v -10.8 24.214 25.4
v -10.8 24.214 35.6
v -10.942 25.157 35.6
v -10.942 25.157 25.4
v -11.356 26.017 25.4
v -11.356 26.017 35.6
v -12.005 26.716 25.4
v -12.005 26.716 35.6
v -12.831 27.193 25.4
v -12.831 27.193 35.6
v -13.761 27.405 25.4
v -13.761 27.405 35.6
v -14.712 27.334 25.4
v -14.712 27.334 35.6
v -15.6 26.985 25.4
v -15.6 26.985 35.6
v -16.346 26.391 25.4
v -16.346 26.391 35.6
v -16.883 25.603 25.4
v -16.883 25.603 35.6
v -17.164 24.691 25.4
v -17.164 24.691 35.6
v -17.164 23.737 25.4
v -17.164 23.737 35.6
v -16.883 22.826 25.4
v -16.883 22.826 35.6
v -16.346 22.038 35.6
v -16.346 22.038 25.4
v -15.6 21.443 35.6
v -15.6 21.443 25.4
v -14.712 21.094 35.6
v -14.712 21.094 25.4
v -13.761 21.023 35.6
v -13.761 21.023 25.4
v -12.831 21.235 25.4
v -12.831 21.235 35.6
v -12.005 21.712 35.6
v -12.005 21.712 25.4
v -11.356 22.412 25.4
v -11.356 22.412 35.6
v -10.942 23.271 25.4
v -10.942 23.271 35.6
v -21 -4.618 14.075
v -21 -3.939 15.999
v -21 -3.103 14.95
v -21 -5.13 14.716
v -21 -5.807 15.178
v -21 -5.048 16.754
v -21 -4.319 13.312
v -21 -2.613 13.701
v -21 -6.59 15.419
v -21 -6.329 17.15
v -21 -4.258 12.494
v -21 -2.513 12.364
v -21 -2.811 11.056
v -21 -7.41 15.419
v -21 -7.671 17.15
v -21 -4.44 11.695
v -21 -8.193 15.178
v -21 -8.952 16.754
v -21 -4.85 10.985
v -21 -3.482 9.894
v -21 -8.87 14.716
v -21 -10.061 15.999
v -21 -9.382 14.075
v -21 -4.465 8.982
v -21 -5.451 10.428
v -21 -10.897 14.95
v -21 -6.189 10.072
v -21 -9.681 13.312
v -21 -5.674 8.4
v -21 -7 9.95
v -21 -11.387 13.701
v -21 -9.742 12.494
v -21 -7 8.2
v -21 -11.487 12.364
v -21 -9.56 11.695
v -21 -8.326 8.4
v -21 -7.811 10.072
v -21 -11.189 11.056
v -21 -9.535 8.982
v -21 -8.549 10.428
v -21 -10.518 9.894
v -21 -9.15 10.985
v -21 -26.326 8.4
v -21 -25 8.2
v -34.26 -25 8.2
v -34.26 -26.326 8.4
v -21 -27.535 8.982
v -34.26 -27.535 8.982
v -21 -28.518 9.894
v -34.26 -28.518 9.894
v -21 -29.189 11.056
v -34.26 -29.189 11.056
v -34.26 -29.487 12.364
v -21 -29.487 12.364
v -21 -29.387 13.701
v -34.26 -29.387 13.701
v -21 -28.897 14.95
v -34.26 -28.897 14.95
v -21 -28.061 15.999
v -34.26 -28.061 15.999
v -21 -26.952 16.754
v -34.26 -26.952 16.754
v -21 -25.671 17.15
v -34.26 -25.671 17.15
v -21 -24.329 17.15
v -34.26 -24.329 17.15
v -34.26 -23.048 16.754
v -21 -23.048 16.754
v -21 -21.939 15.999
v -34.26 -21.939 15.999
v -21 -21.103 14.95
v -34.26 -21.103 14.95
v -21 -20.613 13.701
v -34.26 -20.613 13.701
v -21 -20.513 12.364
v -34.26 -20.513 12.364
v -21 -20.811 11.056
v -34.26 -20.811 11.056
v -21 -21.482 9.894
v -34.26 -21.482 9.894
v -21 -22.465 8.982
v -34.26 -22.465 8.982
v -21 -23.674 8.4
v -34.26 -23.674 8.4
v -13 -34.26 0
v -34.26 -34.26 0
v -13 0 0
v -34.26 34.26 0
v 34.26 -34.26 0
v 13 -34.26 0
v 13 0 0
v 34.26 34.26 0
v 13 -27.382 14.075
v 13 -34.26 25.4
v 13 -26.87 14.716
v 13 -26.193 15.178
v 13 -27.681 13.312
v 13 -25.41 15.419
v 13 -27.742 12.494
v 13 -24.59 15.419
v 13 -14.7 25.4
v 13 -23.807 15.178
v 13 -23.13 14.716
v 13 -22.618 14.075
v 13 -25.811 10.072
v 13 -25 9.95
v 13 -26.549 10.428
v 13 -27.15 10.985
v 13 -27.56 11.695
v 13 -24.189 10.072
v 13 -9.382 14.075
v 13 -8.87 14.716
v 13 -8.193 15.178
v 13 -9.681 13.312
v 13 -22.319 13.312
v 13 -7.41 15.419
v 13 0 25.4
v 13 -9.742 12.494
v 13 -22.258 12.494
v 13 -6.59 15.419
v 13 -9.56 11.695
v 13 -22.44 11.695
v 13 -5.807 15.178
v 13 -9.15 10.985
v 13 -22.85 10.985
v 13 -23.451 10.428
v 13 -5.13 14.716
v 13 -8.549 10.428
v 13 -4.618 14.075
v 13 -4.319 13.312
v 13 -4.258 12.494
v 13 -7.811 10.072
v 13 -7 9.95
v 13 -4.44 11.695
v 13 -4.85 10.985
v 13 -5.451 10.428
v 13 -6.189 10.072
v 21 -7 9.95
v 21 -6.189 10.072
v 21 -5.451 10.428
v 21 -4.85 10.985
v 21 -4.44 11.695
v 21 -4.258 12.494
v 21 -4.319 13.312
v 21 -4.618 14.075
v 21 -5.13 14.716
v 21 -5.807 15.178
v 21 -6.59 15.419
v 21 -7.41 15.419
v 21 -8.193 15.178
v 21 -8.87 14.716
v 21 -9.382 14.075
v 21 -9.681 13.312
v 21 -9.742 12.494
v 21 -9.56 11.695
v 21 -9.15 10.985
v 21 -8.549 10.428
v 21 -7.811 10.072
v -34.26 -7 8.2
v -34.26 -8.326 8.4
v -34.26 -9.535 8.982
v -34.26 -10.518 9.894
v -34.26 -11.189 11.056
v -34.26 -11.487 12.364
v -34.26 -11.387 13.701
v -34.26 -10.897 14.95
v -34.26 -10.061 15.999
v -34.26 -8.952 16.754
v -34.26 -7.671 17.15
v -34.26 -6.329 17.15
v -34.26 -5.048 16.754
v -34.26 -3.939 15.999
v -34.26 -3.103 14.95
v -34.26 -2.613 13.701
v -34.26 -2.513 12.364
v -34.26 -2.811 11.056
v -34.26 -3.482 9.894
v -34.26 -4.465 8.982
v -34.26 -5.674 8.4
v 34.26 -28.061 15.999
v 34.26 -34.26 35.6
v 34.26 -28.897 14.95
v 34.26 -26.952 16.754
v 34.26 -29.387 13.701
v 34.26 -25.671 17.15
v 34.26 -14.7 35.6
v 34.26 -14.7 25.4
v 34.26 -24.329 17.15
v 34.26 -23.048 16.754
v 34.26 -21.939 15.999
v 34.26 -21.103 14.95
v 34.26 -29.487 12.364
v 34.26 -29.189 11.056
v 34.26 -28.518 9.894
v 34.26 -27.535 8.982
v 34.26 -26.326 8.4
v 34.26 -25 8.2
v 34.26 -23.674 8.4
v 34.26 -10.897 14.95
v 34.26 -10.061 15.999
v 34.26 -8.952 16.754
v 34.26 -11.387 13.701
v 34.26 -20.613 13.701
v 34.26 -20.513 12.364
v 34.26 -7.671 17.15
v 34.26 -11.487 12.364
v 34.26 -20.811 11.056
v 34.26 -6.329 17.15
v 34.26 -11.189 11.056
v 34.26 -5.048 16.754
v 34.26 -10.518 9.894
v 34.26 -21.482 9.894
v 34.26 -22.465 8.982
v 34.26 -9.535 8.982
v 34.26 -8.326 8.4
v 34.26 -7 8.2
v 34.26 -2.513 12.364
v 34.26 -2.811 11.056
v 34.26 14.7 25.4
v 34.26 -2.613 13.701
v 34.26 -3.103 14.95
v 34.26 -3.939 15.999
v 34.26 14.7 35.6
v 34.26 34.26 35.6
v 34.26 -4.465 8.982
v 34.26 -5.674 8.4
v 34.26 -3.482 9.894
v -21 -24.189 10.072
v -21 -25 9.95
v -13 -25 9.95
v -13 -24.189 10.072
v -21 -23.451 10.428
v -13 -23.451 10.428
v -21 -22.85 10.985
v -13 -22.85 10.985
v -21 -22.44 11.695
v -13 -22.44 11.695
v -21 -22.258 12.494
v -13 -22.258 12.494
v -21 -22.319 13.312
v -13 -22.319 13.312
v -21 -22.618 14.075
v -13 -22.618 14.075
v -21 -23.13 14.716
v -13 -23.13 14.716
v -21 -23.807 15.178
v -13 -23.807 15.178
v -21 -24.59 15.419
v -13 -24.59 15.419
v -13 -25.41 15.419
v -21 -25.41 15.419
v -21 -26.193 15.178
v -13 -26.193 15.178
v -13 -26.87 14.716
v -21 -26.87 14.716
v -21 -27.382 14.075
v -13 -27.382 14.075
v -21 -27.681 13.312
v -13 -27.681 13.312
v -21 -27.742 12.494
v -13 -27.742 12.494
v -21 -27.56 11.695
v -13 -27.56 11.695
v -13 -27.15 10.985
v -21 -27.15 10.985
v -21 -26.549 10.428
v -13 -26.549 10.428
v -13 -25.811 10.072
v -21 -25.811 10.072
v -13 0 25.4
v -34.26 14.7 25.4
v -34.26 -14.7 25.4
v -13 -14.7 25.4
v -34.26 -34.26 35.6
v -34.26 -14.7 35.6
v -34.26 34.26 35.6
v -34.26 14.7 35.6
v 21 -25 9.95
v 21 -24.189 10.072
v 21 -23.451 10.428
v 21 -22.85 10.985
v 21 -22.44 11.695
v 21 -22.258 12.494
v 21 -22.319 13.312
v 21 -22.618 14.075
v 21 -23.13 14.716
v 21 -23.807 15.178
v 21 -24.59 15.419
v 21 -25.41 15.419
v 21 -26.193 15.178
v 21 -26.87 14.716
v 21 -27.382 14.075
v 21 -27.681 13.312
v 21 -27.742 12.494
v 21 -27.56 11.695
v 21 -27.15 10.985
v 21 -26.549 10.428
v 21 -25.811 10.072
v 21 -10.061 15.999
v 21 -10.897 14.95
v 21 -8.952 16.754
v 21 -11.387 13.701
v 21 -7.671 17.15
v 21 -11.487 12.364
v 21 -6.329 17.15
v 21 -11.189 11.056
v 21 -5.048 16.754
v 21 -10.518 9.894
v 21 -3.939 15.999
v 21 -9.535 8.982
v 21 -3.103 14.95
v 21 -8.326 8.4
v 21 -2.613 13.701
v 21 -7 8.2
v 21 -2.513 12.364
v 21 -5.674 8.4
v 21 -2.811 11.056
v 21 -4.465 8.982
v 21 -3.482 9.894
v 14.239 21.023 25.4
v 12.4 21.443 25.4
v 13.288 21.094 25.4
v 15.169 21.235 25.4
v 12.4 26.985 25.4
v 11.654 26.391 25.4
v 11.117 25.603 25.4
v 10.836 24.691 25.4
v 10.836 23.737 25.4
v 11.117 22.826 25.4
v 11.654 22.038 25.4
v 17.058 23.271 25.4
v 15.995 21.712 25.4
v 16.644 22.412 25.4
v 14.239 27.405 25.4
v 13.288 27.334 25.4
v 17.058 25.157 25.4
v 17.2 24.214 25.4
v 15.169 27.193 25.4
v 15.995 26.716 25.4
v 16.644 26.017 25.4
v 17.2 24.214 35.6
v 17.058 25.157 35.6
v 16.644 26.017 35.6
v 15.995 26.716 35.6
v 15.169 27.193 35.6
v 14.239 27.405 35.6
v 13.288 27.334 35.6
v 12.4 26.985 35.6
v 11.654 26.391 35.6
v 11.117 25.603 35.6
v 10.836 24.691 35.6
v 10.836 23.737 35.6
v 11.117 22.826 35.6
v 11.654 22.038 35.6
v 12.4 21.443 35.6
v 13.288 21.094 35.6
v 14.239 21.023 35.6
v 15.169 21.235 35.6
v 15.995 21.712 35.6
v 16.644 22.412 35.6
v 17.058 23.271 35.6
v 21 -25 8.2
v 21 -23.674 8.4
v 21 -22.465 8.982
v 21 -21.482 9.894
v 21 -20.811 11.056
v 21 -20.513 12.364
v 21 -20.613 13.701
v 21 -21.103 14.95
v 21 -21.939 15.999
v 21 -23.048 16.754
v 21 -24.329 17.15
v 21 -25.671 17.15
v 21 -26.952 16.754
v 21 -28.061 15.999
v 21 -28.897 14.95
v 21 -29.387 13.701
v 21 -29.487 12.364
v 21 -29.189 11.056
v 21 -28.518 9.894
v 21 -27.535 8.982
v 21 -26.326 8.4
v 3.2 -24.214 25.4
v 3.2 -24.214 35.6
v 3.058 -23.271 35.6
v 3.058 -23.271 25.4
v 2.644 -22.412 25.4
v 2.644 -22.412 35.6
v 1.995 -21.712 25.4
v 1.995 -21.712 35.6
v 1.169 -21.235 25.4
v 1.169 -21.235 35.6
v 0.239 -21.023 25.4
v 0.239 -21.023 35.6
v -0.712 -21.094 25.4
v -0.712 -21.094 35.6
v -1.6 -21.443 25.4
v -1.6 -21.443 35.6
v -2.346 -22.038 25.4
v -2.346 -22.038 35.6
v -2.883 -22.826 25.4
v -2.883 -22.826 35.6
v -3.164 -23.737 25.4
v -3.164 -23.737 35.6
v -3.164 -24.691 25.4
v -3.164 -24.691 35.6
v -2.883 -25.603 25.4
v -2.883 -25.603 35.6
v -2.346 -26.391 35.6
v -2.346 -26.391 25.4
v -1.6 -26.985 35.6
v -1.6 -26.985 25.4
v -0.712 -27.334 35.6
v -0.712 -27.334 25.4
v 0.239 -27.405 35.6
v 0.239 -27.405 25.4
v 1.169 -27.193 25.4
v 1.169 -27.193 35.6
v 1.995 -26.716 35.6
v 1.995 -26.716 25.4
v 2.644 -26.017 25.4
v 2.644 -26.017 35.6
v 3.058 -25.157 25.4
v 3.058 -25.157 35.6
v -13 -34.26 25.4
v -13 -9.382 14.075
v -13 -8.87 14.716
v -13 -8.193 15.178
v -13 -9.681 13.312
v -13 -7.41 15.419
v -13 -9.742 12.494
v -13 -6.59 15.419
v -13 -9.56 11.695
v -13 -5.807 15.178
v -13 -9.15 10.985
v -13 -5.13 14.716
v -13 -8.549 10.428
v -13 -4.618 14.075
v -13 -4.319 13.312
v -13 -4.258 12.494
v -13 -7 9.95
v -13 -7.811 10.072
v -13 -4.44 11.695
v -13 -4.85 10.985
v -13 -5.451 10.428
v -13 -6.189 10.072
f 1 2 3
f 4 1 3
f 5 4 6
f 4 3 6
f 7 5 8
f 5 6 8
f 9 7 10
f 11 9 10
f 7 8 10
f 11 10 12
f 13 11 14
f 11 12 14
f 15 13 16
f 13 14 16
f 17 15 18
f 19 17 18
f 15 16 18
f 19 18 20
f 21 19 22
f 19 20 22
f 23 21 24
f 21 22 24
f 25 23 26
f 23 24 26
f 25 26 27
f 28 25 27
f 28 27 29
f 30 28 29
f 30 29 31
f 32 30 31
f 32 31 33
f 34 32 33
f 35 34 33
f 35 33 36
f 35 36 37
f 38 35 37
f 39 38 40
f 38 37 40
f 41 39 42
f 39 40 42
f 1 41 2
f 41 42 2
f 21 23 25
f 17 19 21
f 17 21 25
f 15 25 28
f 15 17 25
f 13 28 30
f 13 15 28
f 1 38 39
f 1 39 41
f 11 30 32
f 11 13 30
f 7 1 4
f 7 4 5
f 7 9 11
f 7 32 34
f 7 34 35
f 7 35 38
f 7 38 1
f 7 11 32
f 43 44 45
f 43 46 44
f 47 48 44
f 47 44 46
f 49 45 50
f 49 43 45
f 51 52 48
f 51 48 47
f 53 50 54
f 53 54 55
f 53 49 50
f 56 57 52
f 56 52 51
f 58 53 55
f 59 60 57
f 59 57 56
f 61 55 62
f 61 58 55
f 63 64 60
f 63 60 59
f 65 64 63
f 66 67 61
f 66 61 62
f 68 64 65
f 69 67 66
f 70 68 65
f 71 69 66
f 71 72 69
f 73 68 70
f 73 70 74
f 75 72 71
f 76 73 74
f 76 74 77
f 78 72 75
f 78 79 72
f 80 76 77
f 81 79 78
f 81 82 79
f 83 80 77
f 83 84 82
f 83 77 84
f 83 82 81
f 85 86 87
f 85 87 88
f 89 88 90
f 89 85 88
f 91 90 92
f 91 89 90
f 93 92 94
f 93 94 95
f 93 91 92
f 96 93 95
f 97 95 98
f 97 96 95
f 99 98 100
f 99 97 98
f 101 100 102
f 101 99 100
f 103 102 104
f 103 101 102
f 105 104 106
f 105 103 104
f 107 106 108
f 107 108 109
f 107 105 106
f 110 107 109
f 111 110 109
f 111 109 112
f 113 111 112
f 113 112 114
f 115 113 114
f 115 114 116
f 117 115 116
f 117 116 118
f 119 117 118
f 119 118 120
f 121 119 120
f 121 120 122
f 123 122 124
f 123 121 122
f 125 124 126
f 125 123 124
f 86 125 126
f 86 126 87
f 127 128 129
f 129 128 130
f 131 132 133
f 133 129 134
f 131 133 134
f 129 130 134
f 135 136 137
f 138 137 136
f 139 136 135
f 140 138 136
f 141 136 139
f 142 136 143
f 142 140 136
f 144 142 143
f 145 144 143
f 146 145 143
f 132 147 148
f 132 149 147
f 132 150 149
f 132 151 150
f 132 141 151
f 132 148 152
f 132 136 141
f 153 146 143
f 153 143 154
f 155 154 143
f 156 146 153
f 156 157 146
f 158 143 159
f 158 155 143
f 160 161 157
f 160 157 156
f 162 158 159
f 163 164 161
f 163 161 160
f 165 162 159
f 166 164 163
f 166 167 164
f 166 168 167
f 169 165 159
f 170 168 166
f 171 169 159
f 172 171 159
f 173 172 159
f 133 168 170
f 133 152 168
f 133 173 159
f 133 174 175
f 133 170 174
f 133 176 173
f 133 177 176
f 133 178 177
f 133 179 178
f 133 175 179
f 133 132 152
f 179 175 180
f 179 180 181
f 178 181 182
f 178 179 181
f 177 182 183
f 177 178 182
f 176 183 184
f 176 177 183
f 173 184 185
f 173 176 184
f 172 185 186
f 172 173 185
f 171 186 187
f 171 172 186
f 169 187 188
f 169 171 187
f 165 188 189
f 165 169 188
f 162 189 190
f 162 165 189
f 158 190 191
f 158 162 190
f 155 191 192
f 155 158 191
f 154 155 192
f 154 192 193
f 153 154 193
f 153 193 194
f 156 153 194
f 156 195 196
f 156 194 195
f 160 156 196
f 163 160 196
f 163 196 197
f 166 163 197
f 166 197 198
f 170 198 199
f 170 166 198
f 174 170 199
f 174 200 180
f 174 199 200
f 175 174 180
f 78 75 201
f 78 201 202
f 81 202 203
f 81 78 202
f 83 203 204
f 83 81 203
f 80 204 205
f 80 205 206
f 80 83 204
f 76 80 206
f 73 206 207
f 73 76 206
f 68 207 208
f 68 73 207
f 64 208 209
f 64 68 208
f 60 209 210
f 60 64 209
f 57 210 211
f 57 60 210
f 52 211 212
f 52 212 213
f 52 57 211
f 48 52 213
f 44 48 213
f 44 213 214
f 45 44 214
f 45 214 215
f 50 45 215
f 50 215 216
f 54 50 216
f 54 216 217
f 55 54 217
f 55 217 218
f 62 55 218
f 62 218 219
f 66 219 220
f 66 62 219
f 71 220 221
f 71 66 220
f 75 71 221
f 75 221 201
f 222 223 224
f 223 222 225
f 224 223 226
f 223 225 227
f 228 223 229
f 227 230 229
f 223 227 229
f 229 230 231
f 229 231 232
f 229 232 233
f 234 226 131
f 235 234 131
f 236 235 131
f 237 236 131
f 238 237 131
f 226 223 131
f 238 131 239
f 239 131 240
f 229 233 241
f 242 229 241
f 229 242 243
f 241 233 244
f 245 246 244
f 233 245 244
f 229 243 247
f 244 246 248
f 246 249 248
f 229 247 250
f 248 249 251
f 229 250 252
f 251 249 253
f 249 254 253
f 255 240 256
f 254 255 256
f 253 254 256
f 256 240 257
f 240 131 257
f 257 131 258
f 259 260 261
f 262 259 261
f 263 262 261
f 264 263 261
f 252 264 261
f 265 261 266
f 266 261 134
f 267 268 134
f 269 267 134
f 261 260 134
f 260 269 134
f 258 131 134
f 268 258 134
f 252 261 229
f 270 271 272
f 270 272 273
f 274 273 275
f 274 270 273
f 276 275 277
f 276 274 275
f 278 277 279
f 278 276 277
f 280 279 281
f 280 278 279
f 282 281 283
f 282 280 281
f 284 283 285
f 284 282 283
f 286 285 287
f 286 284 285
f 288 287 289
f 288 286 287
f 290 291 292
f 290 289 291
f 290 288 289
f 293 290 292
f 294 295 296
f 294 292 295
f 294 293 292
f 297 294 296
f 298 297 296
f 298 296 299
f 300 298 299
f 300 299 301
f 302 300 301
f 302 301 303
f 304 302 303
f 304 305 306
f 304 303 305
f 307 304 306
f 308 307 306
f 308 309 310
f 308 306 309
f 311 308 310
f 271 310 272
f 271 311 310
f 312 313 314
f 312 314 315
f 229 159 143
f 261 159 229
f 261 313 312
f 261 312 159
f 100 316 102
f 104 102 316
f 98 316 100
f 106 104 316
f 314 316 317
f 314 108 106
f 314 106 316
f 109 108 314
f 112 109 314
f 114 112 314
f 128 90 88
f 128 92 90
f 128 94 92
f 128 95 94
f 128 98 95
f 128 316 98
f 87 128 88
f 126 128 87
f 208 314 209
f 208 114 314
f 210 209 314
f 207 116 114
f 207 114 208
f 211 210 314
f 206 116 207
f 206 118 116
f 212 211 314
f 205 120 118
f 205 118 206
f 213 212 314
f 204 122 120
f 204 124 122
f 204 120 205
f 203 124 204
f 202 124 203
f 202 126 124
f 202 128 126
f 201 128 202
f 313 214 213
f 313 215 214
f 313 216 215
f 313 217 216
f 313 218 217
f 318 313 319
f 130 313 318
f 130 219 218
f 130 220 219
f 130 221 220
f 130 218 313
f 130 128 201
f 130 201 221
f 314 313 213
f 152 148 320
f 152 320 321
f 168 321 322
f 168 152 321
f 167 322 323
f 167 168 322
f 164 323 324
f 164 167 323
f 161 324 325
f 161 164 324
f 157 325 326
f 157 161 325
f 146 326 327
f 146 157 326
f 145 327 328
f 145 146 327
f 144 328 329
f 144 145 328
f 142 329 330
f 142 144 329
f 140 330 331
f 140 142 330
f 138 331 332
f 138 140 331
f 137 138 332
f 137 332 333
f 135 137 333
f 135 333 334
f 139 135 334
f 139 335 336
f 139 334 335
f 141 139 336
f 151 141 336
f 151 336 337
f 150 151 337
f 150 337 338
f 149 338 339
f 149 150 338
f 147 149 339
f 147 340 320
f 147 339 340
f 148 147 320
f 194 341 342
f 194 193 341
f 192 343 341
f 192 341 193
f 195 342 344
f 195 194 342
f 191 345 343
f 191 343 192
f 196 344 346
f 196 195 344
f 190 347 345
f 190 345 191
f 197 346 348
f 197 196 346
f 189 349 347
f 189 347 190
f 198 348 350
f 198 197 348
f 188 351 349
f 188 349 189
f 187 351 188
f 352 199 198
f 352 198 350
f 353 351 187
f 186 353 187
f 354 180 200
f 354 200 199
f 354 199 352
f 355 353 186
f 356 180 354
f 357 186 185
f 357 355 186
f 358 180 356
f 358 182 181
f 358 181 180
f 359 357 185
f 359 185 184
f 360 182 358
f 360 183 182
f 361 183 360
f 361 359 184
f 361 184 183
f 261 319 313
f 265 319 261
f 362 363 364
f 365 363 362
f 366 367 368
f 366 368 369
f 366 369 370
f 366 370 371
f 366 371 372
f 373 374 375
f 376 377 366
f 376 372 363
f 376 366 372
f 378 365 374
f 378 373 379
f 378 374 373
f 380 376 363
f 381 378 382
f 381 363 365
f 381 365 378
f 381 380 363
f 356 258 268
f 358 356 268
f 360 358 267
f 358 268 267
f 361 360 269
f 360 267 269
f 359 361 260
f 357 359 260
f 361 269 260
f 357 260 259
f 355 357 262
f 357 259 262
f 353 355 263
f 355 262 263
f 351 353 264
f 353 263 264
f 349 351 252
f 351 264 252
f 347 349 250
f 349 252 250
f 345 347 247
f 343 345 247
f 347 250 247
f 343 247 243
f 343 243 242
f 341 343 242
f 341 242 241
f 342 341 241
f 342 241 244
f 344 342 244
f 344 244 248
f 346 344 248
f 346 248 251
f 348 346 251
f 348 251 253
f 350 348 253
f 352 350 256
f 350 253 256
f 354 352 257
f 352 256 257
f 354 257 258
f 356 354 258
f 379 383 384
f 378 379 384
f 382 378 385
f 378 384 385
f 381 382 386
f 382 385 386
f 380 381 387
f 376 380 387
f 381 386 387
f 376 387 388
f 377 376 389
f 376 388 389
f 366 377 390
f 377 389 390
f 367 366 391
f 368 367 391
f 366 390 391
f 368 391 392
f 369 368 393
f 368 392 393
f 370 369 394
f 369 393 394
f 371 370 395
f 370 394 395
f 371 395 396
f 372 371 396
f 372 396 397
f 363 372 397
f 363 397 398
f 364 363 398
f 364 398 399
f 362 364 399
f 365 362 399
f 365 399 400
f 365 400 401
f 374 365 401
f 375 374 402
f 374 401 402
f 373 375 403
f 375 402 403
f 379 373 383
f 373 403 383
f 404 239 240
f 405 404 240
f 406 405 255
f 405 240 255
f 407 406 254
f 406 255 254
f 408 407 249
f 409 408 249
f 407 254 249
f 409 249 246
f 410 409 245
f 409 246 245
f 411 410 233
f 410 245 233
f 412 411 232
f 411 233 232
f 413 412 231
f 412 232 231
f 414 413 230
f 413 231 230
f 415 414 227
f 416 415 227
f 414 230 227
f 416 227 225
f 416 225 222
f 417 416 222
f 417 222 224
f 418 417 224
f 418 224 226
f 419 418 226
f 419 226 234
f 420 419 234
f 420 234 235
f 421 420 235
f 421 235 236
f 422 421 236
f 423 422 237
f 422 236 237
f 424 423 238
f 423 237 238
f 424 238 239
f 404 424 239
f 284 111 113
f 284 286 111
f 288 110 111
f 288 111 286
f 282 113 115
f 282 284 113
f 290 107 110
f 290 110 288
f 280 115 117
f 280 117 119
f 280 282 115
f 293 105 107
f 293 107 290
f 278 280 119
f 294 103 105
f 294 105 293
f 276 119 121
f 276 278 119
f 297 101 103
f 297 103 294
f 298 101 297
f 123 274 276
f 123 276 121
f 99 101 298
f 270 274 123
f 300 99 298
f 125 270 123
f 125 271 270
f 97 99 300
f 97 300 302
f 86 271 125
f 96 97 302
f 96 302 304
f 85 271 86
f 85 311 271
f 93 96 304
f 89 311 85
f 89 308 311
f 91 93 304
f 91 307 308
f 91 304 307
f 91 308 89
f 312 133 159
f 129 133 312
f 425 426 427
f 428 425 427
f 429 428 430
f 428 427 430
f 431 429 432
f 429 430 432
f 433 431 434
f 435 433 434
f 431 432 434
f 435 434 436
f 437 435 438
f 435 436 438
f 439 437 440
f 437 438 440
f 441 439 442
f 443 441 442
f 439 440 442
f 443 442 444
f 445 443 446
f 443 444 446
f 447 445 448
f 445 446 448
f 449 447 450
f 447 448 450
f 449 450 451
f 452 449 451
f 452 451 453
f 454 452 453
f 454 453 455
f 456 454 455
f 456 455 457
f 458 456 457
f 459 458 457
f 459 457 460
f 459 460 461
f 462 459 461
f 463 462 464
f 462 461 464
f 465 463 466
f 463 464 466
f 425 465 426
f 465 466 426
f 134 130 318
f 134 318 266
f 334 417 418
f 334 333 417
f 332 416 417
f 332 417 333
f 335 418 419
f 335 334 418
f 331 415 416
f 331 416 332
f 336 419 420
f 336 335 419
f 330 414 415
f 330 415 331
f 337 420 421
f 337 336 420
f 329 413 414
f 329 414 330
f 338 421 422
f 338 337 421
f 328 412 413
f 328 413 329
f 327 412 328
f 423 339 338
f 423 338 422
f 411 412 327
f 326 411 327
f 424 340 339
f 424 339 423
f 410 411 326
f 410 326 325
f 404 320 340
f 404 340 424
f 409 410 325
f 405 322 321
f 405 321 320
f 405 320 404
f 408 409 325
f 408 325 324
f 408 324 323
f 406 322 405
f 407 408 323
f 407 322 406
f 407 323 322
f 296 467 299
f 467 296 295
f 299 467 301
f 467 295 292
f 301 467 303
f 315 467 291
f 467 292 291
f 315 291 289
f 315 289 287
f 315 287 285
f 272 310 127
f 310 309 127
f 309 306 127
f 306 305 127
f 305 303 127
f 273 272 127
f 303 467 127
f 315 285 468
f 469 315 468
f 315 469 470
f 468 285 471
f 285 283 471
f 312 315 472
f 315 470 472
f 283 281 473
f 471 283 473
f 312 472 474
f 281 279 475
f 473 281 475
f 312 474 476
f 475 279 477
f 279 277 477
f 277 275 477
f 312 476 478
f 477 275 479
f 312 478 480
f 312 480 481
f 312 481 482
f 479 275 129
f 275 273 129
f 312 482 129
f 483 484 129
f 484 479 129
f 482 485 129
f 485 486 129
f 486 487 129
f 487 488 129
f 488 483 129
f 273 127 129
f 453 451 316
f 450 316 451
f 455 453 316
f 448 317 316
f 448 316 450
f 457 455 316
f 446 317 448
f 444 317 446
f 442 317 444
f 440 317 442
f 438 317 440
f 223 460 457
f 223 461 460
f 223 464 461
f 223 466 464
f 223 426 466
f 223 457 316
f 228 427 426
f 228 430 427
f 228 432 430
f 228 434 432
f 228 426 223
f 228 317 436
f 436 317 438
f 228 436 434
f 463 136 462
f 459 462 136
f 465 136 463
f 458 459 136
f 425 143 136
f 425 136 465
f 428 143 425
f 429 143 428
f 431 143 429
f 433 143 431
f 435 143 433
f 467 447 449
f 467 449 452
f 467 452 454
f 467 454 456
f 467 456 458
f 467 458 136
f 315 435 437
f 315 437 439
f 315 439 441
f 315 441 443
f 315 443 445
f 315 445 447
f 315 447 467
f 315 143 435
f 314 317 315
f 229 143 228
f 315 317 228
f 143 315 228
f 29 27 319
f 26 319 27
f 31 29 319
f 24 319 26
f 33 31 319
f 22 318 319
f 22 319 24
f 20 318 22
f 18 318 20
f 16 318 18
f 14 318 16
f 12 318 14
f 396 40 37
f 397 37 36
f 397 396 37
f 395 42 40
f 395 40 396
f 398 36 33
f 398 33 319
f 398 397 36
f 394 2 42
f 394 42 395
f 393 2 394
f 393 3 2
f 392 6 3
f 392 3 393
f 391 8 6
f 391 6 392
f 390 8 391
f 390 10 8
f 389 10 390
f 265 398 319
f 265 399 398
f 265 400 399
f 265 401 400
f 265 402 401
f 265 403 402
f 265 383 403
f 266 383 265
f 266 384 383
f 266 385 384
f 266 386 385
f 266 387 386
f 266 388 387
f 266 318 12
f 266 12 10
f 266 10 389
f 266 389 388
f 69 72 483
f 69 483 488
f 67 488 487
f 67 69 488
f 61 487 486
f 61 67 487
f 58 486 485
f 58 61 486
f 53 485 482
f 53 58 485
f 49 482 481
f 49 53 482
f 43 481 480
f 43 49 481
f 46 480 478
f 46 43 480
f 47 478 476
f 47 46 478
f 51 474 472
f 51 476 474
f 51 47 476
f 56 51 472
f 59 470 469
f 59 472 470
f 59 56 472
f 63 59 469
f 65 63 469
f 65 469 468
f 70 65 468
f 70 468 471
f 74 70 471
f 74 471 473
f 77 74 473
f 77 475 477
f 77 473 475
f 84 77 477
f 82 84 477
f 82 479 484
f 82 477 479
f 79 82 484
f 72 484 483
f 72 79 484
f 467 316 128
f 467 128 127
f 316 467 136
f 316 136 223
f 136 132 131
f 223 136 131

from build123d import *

# Parameters (mm, degrees)
SKETCH1_W               = 68.52
SKETCH1_H               = 68.52
BOSS_EXTRUDE1_DEPTH     = 35.6
SKETCH2_W               = 68.52
SKETCH2_H               = 29.4
CUT_EXTRUDE1_DEPTH      = 10.2
SKETCH3_R               = 3.2
CUT_EXTRUDE2_DEPTH      = 10.2
SKETCH4_W               = 26
SKETCH4_H               = 34.26
CUT_EXTRUDE3_DEPTH      = 25.4
CUT_EXTRUDE4_DEPTH      = 85.47542838
CUT_EXTRUDE4_DEPTH_BACK = 85.47542838
SKETCH6_R               = 2.75
SKETCH7_R               = 4.5
CUT_EXTRUDE5_DEPTH      = 13.26
CUT_EXTRUDE6_START      = -13.26
SKETCH8_R               = 4.5
CUT_EXTRUDE6_DEPTH      = 13.26


with BuildPart() as part:
    # Sketch1 → Boss-Extrude1 (new body)
    with BuildSketch(Plane.XY):
        Rectangle(SKETCH1_W, SKETCH1_H)
    extrude(amount=BOSS_EXTRUDE1_DEPTH)

    # Sketch2 → Cut-Extrude1 (cut)
    with BuildSketch(Plane.XY.offset(35.6)):
        Rectangle(SKETCH2_W, SKETCH2_H)
    extrude(amount=-CUT_EXTRUDE1_DEPTH, mode=Mode.SUBTRACT)

    # Sketch3 → Cut-Extrude2 (cut)
    with BuildSketch(Plane.XY.offset(35.6)):
        with Locations((-14, 24.2141445)):
            Circle(SKETCH3_R)
        with Locations((14, 24.2141445)):
            Circle(SKETCH3_R)
        with Locations((0, -24.2141445)):
            Circle(SKETCH3_R)
    extrude(amount=-CUT_EXTRUDE2_DEPTH, mode=Mode.SUBTRACT)

    # Sketch4 → Cut-Extrude3 (cut)
    with BuildSketch(Plane(origin=(0, 0, 0), x_dir=(-1, 0, 0), z_dir=(0, 0, -1))):
        with Locations((0, -17.13)):
            Rectangle(SKETCH4_W, SKETCH4_H)
    extrude(amount=-CUT_EXTRUDE3_DEPTH, mode=Mode.SUBTRACT)

    # Sketch6 → Cut-Extrude4 (cut, two sides: drawn at the far end of the back side and taken through both)
    with BuildSketch(Plane(origin=(34.26, 0, 0), x_dir=(0, 0, -1), z_dir=(1, 0, 0)).offset(-CUT_EXTRUDE4_DEPTH_BACK)):
        with Locations((-12.7, -7)):
            Circle(SKETCH6_R)
        with Locations((-12.7, -25)):
            Circle(SKETCH6_R)
    extrude(amount=CUT_EXTRUDE4_DEPTH + CUT_EXTRUDE4_DEPTH_BACK, mode=Mode.SUBTRACT)

    # Sketch7 → Cut-Extrude5 (cut)
    with BuildSketch(Plane(origin=(34.26, 0, 0), x_dir=(0, 0, -1), z_dir=(1, 0, 0))):
        with Locations((-12.7, -7)):
            Circle(SKETCH7_R)
        with Locations((-12.7, -25)):
            Circle(SKETCH7_R)
    extrude(amount=-CUT_EXTRUDE5_DEPTH, mode=Mode.SUBTRACT)

    # Sketch8 → Cut-Extrude6 (cut)
    with BuildSketch(Plane.ZY.offset(34.26).offset(CUT_EXTRUDE6_START)):
        with Locations(Location((12.7, -7, 0), (0, 0, 180))):
            Circle(SKETCH8_R)
        with Locations(Location((12.7, -25, 0), (0, 0, 180))):
            Circle(SKETCH8_R)
    extrude(amount=CUT_EXTRUDE6_DEPTH, mode=Mode.SUBTRACT)


solid = part.part
